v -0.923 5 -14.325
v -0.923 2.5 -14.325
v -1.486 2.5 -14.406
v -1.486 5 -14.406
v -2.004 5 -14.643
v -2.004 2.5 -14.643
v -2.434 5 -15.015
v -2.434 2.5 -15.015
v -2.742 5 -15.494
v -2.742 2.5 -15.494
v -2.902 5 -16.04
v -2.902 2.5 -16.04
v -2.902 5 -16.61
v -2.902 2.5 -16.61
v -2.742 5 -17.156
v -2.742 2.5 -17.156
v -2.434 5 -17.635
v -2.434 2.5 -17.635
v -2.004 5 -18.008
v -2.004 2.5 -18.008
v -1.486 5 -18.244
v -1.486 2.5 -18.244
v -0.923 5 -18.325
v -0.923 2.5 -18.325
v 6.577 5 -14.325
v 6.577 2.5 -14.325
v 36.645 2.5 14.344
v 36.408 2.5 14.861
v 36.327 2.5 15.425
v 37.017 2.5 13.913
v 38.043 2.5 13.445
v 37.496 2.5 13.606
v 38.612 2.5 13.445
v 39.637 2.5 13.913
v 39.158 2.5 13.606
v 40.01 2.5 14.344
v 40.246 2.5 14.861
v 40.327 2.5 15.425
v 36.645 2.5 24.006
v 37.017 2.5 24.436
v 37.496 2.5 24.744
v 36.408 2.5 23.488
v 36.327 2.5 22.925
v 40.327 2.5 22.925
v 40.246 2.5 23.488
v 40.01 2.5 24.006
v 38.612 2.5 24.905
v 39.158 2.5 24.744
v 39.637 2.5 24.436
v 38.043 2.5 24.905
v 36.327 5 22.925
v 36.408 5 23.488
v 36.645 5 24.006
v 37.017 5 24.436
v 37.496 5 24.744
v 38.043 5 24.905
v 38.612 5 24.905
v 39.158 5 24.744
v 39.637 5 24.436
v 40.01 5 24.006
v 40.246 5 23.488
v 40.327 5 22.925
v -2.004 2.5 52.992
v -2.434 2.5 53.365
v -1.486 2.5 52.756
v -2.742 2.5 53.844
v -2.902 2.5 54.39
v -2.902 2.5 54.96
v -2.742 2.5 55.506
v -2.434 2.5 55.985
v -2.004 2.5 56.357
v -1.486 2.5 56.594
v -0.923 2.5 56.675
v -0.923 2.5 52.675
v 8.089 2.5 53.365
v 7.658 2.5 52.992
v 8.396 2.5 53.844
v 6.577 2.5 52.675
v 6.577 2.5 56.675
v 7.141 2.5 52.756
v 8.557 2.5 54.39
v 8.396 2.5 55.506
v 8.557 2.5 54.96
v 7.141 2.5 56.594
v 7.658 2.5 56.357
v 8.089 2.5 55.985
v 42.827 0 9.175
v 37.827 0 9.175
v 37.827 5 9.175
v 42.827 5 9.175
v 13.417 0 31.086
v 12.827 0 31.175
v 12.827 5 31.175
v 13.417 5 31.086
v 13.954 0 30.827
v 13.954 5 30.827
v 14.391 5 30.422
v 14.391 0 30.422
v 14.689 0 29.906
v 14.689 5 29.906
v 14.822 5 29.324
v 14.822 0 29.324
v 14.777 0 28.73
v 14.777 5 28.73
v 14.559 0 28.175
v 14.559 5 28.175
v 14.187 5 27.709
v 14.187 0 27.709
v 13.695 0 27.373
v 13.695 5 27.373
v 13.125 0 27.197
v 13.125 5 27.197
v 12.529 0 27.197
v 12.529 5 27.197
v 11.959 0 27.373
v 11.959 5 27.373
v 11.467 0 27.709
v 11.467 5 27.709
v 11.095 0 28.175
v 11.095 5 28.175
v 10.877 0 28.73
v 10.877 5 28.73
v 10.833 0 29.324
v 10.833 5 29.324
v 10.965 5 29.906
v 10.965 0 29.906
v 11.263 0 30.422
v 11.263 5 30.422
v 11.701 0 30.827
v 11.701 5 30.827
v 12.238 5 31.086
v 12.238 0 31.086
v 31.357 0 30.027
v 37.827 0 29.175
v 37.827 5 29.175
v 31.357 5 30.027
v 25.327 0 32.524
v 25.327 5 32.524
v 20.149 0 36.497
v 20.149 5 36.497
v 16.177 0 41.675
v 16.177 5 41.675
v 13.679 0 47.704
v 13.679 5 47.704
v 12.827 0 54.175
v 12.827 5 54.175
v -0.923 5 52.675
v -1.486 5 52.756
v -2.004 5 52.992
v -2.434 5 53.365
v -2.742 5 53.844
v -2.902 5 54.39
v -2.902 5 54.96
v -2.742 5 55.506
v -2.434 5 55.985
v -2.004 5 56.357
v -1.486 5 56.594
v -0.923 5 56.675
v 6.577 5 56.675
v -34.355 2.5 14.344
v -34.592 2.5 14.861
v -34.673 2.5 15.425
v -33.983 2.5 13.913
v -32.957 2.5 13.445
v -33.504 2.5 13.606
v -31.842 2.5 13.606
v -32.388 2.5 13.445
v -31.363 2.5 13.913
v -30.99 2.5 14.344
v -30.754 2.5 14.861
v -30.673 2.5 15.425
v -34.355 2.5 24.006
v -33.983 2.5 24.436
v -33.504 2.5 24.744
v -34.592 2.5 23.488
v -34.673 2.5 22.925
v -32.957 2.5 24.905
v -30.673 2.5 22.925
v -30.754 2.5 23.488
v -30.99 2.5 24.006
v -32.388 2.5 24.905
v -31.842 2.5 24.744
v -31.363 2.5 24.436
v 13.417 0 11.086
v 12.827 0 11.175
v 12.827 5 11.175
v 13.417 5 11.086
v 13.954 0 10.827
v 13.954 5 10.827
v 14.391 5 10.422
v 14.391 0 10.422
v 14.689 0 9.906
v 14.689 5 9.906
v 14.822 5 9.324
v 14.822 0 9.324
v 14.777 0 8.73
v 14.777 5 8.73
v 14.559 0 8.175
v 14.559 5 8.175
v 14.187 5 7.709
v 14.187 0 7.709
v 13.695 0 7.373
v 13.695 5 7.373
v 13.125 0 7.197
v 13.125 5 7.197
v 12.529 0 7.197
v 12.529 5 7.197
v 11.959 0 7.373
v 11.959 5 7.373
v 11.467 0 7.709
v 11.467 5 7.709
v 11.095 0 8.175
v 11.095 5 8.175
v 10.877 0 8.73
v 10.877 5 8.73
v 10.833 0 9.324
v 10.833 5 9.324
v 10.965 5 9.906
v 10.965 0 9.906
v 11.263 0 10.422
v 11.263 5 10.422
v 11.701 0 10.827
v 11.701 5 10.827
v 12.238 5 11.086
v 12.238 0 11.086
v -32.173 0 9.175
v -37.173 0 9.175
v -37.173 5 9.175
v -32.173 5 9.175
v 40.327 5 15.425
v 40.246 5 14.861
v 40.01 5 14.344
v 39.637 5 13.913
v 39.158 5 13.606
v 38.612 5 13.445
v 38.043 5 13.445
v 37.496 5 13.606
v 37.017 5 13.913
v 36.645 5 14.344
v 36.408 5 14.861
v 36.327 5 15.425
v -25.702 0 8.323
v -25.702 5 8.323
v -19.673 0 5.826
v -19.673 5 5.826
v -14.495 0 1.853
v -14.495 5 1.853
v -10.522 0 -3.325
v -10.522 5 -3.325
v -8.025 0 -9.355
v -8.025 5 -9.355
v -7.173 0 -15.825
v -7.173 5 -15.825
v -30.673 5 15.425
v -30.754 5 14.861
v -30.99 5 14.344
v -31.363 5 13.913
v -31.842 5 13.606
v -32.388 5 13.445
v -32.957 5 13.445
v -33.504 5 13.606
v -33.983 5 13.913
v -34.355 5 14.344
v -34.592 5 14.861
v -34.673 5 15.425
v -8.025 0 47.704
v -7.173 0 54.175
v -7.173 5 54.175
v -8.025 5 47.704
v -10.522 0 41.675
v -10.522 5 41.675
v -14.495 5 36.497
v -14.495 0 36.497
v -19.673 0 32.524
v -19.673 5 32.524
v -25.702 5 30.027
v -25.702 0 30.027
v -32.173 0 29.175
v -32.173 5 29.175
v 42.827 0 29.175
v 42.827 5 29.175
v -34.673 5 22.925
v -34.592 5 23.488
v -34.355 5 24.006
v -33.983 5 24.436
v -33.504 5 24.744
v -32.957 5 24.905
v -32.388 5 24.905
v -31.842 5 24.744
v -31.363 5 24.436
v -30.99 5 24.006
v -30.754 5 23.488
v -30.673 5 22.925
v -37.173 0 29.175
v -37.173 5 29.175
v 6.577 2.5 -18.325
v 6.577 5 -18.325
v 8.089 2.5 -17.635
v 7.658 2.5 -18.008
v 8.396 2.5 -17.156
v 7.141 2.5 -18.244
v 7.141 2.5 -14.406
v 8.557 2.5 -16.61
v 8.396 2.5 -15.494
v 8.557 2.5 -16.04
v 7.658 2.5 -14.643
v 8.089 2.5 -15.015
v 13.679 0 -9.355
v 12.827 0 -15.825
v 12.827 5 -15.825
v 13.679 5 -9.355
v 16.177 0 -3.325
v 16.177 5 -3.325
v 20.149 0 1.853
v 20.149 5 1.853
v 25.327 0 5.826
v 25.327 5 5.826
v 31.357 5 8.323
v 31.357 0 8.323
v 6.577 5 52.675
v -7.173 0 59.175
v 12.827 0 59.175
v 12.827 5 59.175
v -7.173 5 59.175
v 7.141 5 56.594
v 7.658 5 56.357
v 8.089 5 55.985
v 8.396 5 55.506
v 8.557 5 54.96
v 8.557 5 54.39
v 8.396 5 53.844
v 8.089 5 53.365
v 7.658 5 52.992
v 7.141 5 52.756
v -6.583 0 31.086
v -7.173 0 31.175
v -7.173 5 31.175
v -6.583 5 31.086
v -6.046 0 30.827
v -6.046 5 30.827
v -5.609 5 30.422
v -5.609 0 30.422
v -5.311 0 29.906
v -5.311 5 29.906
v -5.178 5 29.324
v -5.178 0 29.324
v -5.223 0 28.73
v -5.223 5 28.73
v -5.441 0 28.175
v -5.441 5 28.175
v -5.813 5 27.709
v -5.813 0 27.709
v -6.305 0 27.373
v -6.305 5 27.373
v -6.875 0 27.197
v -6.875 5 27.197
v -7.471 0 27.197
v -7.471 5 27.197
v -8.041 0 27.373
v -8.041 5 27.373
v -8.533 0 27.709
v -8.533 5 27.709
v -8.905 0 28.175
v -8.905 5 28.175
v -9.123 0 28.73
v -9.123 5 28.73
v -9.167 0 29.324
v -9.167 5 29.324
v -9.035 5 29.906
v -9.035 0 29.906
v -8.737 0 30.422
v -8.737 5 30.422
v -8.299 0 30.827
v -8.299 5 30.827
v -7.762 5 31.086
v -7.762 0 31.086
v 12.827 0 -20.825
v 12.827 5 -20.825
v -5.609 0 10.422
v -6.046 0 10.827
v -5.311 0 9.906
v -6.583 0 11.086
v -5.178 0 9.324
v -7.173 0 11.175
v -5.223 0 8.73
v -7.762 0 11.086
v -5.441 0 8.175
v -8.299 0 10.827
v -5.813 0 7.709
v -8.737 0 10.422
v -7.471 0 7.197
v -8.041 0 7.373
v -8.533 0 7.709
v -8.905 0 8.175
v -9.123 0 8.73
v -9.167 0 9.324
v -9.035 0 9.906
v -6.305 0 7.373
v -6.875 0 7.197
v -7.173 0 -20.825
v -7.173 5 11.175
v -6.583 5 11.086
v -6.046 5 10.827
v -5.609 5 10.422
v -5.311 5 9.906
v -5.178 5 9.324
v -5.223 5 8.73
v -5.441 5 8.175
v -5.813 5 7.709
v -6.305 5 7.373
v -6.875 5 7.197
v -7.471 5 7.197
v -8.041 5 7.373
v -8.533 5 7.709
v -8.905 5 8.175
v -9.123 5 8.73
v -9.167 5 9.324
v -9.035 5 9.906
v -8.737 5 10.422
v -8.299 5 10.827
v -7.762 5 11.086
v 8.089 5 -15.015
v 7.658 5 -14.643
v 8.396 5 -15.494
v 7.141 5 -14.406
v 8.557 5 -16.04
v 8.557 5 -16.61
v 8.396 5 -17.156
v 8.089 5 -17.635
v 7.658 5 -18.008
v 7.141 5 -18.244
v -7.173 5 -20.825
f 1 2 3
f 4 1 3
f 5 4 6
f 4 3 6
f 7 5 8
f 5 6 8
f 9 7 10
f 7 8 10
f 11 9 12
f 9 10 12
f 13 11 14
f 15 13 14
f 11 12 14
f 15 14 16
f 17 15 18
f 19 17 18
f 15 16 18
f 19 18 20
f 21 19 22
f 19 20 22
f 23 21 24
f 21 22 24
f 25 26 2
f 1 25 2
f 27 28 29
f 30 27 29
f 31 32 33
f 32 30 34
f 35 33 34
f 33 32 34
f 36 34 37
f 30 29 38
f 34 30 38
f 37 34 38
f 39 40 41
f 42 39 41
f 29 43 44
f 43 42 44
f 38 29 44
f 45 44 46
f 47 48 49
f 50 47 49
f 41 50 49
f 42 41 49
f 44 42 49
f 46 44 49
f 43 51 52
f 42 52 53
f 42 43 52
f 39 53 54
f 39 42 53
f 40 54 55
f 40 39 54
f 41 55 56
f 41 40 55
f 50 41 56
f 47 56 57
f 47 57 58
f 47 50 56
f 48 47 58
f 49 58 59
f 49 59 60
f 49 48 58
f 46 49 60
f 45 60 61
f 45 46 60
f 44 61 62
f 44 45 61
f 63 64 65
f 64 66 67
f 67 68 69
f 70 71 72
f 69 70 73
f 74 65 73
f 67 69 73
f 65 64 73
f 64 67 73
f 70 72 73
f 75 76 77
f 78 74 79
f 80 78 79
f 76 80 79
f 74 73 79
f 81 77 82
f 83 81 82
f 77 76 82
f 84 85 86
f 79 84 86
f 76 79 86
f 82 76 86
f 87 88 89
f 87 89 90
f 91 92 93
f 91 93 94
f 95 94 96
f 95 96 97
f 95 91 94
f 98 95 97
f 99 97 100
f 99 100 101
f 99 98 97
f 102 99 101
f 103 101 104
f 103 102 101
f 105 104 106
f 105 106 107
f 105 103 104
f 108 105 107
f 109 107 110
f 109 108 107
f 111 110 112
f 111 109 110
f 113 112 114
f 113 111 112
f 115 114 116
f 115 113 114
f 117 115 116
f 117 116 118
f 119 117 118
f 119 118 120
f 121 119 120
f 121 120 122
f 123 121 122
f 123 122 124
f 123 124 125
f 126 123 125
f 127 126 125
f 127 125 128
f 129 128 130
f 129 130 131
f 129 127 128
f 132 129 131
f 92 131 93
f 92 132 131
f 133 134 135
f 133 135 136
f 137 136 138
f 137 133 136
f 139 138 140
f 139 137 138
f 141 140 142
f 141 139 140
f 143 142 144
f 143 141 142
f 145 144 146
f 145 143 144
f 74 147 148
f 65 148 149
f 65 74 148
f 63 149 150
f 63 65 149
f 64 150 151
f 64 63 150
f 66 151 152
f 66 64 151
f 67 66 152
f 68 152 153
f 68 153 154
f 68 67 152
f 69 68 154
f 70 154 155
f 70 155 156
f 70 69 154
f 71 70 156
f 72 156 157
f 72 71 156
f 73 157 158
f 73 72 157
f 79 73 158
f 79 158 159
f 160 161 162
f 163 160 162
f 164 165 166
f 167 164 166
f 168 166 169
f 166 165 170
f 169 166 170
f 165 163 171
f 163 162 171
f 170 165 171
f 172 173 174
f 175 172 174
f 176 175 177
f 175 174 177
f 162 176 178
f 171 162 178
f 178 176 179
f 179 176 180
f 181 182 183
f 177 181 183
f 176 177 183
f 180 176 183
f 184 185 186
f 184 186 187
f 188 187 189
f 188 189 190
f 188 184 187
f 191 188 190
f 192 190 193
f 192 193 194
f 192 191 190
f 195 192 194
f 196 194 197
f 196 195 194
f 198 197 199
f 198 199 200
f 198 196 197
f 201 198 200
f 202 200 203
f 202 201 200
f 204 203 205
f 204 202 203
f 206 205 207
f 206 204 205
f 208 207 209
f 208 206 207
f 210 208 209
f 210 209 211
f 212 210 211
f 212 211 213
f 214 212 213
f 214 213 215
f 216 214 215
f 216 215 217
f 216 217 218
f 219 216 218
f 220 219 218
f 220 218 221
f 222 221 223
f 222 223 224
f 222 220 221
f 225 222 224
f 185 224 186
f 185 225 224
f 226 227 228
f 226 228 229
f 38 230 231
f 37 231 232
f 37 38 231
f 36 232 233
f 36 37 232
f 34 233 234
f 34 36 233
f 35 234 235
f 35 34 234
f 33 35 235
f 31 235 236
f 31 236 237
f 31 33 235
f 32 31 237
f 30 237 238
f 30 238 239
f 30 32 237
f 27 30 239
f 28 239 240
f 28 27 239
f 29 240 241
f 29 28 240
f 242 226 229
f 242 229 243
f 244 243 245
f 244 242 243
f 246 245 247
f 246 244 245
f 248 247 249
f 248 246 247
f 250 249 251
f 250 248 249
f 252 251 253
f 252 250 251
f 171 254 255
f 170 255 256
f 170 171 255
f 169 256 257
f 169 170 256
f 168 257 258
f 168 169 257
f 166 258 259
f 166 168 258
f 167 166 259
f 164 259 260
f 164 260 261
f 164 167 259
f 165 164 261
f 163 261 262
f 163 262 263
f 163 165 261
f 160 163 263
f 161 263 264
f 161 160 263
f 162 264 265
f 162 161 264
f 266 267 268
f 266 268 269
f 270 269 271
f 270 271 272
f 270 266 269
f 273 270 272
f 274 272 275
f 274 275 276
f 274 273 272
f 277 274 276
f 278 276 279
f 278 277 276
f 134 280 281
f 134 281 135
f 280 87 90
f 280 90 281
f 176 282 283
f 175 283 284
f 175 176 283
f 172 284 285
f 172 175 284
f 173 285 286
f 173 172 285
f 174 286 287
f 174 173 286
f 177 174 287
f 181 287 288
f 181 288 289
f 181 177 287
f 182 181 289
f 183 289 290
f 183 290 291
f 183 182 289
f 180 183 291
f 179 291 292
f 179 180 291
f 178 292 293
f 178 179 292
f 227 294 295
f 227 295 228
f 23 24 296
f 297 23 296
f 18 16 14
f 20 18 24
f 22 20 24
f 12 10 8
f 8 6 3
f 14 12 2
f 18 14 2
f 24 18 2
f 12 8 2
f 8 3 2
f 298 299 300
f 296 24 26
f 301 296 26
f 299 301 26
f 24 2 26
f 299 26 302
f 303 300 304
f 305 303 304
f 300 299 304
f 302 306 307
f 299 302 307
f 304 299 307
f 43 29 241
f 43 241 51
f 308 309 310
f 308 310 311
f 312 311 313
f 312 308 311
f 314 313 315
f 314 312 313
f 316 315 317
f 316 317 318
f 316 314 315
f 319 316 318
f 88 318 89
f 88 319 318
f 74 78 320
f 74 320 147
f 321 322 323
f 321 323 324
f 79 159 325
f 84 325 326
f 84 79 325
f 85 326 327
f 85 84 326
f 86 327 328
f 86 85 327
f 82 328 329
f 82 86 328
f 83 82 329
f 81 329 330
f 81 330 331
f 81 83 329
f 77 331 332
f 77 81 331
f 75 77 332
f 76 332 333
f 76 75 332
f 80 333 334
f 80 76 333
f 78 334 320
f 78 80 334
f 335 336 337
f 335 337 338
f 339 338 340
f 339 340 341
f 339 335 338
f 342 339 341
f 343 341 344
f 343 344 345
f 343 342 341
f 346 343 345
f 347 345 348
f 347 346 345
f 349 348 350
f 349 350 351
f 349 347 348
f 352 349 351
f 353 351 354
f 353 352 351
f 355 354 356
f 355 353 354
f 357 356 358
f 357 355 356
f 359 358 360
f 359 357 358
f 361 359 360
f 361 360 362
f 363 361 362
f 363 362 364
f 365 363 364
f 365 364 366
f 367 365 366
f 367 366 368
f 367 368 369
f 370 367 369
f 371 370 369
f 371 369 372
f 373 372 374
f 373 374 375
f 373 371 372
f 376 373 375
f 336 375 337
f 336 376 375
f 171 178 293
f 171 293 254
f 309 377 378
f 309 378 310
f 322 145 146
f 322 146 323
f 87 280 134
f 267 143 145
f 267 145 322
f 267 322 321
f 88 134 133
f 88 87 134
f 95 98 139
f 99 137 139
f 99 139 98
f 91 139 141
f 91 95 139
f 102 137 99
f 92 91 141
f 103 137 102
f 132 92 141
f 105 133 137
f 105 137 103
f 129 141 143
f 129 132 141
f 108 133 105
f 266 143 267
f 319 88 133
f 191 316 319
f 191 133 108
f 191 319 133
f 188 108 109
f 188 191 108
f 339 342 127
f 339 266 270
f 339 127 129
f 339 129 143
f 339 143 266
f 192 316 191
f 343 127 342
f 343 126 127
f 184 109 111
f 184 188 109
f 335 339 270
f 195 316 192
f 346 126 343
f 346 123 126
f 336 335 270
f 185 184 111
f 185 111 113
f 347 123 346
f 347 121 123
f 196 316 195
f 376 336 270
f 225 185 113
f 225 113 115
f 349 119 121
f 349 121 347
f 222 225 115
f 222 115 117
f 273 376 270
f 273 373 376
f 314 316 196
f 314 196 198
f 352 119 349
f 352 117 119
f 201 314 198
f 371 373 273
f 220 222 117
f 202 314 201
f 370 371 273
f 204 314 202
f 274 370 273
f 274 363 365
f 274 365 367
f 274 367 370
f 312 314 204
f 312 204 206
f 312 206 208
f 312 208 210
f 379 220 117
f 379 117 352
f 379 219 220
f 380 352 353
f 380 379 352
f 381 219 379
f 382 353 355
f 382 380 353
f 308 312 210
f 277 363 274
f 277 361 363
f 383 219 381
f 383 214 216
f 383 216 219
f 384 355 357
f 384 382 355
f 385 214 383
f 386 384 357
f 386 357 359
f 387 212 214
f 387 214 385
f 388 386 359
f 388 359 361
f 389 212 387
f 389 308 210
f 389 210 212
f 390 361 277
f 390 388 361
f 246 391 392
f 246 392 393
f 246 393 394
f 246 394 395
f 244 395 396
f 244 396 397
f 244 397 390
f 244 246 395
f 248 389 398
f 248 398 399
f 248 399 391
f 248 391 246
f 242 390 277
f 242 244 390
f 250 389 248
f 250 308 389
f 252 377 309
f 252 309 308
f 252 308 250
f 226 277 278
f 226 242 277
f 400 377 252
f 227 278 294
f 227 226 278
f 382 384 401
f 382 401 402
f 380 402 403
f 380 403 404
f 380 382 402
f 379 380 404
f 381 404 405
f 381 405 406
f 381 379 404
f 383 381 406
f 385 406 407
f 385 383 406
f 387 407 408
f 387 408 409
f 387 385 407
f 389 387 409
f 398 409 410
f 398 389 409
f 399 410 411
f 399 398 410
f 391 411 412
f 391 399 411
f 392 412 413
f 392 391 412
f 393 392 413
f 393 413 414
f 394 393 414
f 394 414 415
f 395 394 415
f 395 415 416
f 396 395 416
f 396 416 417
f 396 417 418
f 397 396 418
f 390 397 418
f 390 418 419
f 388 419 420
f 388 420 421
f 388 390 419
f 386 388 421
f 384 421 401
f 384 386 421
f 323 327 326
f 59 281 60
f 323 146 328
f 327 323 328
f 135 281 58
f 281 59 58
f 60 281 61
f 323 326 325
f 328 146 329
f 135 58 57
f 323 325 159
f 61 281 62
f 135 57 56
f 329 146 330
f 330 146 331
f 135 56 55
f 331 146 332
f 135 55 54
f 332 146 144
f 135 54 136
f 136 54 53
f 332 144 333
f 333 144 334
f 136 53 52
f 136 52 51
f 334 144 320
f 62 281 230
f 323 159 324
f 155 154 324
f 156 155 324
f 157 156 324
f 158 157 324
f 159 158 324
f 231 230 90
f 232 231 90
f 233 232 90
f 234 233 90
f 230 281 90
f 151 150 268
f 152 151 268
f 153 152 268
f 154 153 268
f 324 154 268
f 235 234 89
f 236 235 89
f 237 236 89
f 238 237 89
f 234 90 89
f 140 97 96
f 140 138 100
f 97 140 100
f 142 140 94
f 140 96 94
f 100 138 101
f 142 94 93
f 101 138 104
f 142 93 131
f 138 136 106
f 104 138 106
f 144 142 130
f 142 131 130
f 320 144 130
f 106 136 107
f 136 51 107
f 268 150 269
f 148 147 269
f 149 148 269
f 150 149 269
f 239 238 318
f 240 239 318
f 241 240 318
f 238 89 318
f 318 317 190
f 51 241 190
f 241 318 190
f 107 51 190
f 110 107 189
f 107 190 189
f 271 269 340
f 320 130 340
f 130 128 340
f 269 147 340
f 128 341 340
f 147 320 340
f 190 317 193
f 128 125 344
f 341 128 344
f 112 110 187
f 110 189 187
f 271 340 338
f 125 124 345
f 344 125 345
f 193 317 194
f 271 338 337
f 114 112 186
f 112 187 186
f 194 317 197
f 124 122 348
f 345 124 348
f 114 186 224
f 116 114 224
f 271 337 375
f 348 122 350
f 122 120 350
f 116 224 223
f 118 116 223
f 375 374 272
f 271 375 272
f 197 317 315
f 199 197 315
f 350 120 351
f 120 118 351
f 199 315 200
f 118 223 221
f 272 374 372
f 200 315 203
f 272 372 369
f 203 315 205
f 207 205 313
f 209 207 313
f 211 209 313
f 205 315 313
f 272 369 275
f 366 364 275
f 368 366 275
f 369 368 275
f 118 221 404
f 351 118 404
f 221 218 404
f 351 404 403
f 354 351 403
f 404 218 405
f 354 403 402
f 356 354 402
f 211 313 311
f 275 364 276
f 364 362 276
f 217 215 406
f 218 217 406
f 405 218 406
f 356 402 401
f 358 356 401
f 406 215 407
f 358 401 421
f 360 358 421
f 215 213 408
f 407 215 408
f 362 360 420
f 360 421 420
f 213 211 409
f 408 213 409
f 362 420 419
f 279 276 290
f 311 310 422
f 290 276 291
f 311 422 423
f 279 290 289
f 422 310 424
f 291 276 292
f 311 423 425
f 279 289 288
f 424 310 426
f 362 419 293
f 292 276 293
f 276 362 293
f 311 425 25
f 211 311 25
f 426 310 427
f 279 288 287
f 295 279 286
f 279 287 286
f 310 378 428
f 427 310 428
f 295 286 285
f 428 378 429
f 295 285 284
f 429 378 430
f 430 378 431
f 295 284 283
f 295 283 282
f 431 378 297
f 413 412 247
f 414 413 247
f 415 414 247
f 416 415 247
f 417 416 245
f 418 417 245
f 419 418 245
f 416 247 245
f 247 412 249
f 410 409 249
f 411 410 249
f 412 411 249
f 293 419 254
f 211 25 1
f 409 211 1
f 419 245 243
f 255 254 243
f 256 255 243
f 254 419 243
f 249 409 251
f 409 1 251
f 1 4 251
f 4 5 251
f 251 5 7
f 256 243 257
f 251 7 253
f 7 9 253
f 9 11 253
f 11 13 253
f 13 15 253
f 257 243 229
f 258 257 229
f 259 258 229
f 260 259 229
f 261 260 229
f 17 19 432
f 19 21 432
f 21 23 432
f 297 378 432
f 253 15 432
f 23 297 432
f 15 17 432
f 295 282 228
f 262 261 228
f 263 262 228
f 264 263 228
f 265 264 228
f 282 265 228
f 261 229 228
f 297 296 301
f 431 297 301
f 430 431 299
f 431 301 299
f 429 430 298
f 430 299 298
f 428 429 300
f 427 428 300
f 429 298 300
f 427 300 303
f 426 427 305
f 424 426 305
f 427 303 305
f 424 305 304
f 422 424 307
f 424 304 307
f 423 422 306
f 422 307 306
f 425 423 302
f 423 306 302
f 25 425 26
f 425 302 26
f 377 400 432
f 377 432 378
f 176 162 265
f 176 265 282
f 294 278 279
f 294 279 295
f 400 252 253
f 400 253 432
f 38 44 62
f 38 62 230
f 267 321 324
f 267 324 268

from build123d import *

# Parameters (mm, degrees)
SKETCH1_R           = 2
BOSS_EXTRUDE1_DEPTH = 5
SKETCH2_W           = 4.72967701
SKETCH2_H           = 13.394822952
SKETCH2_W_2         = 13.394822952
SKETCH2_H_2         = 4.72967701
SKETCH2_W_3         = 4.729677011
BOSS_EXTRUDE2_DEPTH = 2.5


with BuildPart() as part:
    # Sketch1 → Boss-Extrude1 (new body)
    with BuildSketch(Plane(origin=(0, 0, 0), x_dir=(1, 0, 0), z_dir=(0, 1, 0))):
        with BuildLine():
            Line((-7.172850367, 15.825076528), (-7.172850367, 20.825076528))
            Line((-7.172850367, 20.825076528), (12.827149633, 20.825076528))
            Line((12.827149633, 20.825076528), (12.827149633, 15.825076528))
            ThreePointArc((12.827149633, 15.825076528), (20.149480103, -1.852593001), (37.827149633, -9.174923472))
            Line((37.827149633, -9.174923472), (42.827149633, -9.174923472))
            Line((42.827149633, -9.174923472), (42.827149633, -29.174923472))
            Line((42.827149633, -29.174923472), (37.827149633, -29.174923472))
            ThreePointArc((37.827149633, -29.174923472), (20.149480103, -36.497253942), (12.827149633, -54.174923472))
            Line((12.827149633, -54.174923472), (12.827149633, -59.174923472))
            Line((12.827149633, -59.174923472), (-7.172850367, -59.174923472))
            Line((-7.172850367, -59.174923472), (-7.172850367, -54.174923472))
            ThreePointArc((-7.172850367, -54.174923472), (-14.495180838, -36.497253942), (-32.172850367, -29.174923472))
            Line((-32.172850367, -29.174923472), (-37.172850367, -29.174923472))
            Line((-37.172850367, -29.174923472), (-37.172850367, -9.174923472))
            Line((-37.172850367, -9.174923472), (-32.172850367, -9.174923472))
            ThreePointArc((-32.172850367, -9.174923472), (-14.495180838, -1.852593001), (-7.172850367, 15.825076528))
        make_face()
        with Locations(Location((-7.172850367, -9.174923472, 0), (0, 0, 270))):
            Circle(SKETCH1_R, mode=Mode.SUBTRACT)
        with Locations(Location((12.827149633, -9.174923472, 0), (0, 0, 270))):
            Circle(SKETCH1_R, mode=Mode.SUBTRACT)
        with Locations(Location((12.827149633, -29.174923472, 0), (0, 0, 270))):
            Circle(SKETCH1_R, mode=Mode.SUBTRACT)
        with Locations(Location((-7.172850367, -29.174923472, 0), (0, 0, 270))):
            Circle(SKETCH1_R, mode=Mode.SUBTRACT)
        with BuildLine():
            Line((-0.922850367, 18.325076528), (6.577149633, 18.325076528))
            ThreePointArc((6.577149633, 18.325076528), (8.577149633, 16.325076528), (6.577149633, 14.325076528))
            Line((6.577149633, 14.325076528), (-0.922850367, 14.325076528))
            ThreePointArc((-0.922850367, 14.325076528), (-2.922850367, 16.325076528), (-0.922850367, 18.325076528))
        make_face(mode=Mode.SUBTRACT)
        with BuildLine():
            Line((36.327149633, -15.424923472), (36.327149633, -22.924923472))
            ThreePointArc((36.327149633, -22.924923472), (38.327149633, -24.924923472), (40.327149633, -22.924923472))
            Line((40.327149633, -22.924923472), (40.327149633, -15.424923472))
            ThreePointArc((40.327149633, -15.424923472), (38.327149633, -13.424923472), (36.327149633, -15.424923472))
        make_face(mode=Mode.SUBTRACT)
        with BuildLine():
            Line((6.577149633, -52.674923472), (-0.922850367, -52.674923472))
            ThreePointArc((-0.922850367, -52.674923472), (-2.922850367, -54.674923472), (-0.922850367, -56.674923472))
            Line((-0.922850367, -56.674923472), (6.577149633, -56.674923472))
            ThreePointArc((6.577149633, -56.674923472), (8.577149633, -54.674923472), (6.577149633, -52.674923472))
        make_face(mode=Mode.SUBTRACT)
        with BuildLine():
            Line((-30.672850367, -22.924923472), (-30.672850367, -15.424923472))
            ThreePointArc((-30.672850367, -15.424923472), (-32.672850367, -13.424923472), (-34.672850367, -15.424923472))
            Line((-34.672850367, -15.424923472), (-34.672850367, -22.924923472))
            ThreePointArc((-34.672850367, -22.924923472), (-32.672850367, -24.924923472), (-30.672850367, -22.924923472))
        make_face(mode=Mode.SUBTRACT)
    extrude(amount=BOSS_EXTRUDE1_DEPTH)

    # Sketch2 → Boss-Extrude2 (add)
    with BuildSketch(Plane.XZ):
        with Locations((38.392291652, 19.174923472)):
            Rectangle(SKETCH2_W, SKETCH2_H)
        with Locations((2.827149633, 54.740065491)):
            Rectangle(SKETCH2_W_2, SKETCH2_H_2)
        with Locations((2.827149633, -16.390218547)):
            Rectangle(SKETCH2_W_2, SKETCH2_H_2)
        with Locations((-32.737992386, 19.174923472)):
            Rectangle(SKETCH2_W_3, SKETCH2_H)
    extrude(amount=-BOSS_EXTRUDE2_DEPTH)


solid = part.part
